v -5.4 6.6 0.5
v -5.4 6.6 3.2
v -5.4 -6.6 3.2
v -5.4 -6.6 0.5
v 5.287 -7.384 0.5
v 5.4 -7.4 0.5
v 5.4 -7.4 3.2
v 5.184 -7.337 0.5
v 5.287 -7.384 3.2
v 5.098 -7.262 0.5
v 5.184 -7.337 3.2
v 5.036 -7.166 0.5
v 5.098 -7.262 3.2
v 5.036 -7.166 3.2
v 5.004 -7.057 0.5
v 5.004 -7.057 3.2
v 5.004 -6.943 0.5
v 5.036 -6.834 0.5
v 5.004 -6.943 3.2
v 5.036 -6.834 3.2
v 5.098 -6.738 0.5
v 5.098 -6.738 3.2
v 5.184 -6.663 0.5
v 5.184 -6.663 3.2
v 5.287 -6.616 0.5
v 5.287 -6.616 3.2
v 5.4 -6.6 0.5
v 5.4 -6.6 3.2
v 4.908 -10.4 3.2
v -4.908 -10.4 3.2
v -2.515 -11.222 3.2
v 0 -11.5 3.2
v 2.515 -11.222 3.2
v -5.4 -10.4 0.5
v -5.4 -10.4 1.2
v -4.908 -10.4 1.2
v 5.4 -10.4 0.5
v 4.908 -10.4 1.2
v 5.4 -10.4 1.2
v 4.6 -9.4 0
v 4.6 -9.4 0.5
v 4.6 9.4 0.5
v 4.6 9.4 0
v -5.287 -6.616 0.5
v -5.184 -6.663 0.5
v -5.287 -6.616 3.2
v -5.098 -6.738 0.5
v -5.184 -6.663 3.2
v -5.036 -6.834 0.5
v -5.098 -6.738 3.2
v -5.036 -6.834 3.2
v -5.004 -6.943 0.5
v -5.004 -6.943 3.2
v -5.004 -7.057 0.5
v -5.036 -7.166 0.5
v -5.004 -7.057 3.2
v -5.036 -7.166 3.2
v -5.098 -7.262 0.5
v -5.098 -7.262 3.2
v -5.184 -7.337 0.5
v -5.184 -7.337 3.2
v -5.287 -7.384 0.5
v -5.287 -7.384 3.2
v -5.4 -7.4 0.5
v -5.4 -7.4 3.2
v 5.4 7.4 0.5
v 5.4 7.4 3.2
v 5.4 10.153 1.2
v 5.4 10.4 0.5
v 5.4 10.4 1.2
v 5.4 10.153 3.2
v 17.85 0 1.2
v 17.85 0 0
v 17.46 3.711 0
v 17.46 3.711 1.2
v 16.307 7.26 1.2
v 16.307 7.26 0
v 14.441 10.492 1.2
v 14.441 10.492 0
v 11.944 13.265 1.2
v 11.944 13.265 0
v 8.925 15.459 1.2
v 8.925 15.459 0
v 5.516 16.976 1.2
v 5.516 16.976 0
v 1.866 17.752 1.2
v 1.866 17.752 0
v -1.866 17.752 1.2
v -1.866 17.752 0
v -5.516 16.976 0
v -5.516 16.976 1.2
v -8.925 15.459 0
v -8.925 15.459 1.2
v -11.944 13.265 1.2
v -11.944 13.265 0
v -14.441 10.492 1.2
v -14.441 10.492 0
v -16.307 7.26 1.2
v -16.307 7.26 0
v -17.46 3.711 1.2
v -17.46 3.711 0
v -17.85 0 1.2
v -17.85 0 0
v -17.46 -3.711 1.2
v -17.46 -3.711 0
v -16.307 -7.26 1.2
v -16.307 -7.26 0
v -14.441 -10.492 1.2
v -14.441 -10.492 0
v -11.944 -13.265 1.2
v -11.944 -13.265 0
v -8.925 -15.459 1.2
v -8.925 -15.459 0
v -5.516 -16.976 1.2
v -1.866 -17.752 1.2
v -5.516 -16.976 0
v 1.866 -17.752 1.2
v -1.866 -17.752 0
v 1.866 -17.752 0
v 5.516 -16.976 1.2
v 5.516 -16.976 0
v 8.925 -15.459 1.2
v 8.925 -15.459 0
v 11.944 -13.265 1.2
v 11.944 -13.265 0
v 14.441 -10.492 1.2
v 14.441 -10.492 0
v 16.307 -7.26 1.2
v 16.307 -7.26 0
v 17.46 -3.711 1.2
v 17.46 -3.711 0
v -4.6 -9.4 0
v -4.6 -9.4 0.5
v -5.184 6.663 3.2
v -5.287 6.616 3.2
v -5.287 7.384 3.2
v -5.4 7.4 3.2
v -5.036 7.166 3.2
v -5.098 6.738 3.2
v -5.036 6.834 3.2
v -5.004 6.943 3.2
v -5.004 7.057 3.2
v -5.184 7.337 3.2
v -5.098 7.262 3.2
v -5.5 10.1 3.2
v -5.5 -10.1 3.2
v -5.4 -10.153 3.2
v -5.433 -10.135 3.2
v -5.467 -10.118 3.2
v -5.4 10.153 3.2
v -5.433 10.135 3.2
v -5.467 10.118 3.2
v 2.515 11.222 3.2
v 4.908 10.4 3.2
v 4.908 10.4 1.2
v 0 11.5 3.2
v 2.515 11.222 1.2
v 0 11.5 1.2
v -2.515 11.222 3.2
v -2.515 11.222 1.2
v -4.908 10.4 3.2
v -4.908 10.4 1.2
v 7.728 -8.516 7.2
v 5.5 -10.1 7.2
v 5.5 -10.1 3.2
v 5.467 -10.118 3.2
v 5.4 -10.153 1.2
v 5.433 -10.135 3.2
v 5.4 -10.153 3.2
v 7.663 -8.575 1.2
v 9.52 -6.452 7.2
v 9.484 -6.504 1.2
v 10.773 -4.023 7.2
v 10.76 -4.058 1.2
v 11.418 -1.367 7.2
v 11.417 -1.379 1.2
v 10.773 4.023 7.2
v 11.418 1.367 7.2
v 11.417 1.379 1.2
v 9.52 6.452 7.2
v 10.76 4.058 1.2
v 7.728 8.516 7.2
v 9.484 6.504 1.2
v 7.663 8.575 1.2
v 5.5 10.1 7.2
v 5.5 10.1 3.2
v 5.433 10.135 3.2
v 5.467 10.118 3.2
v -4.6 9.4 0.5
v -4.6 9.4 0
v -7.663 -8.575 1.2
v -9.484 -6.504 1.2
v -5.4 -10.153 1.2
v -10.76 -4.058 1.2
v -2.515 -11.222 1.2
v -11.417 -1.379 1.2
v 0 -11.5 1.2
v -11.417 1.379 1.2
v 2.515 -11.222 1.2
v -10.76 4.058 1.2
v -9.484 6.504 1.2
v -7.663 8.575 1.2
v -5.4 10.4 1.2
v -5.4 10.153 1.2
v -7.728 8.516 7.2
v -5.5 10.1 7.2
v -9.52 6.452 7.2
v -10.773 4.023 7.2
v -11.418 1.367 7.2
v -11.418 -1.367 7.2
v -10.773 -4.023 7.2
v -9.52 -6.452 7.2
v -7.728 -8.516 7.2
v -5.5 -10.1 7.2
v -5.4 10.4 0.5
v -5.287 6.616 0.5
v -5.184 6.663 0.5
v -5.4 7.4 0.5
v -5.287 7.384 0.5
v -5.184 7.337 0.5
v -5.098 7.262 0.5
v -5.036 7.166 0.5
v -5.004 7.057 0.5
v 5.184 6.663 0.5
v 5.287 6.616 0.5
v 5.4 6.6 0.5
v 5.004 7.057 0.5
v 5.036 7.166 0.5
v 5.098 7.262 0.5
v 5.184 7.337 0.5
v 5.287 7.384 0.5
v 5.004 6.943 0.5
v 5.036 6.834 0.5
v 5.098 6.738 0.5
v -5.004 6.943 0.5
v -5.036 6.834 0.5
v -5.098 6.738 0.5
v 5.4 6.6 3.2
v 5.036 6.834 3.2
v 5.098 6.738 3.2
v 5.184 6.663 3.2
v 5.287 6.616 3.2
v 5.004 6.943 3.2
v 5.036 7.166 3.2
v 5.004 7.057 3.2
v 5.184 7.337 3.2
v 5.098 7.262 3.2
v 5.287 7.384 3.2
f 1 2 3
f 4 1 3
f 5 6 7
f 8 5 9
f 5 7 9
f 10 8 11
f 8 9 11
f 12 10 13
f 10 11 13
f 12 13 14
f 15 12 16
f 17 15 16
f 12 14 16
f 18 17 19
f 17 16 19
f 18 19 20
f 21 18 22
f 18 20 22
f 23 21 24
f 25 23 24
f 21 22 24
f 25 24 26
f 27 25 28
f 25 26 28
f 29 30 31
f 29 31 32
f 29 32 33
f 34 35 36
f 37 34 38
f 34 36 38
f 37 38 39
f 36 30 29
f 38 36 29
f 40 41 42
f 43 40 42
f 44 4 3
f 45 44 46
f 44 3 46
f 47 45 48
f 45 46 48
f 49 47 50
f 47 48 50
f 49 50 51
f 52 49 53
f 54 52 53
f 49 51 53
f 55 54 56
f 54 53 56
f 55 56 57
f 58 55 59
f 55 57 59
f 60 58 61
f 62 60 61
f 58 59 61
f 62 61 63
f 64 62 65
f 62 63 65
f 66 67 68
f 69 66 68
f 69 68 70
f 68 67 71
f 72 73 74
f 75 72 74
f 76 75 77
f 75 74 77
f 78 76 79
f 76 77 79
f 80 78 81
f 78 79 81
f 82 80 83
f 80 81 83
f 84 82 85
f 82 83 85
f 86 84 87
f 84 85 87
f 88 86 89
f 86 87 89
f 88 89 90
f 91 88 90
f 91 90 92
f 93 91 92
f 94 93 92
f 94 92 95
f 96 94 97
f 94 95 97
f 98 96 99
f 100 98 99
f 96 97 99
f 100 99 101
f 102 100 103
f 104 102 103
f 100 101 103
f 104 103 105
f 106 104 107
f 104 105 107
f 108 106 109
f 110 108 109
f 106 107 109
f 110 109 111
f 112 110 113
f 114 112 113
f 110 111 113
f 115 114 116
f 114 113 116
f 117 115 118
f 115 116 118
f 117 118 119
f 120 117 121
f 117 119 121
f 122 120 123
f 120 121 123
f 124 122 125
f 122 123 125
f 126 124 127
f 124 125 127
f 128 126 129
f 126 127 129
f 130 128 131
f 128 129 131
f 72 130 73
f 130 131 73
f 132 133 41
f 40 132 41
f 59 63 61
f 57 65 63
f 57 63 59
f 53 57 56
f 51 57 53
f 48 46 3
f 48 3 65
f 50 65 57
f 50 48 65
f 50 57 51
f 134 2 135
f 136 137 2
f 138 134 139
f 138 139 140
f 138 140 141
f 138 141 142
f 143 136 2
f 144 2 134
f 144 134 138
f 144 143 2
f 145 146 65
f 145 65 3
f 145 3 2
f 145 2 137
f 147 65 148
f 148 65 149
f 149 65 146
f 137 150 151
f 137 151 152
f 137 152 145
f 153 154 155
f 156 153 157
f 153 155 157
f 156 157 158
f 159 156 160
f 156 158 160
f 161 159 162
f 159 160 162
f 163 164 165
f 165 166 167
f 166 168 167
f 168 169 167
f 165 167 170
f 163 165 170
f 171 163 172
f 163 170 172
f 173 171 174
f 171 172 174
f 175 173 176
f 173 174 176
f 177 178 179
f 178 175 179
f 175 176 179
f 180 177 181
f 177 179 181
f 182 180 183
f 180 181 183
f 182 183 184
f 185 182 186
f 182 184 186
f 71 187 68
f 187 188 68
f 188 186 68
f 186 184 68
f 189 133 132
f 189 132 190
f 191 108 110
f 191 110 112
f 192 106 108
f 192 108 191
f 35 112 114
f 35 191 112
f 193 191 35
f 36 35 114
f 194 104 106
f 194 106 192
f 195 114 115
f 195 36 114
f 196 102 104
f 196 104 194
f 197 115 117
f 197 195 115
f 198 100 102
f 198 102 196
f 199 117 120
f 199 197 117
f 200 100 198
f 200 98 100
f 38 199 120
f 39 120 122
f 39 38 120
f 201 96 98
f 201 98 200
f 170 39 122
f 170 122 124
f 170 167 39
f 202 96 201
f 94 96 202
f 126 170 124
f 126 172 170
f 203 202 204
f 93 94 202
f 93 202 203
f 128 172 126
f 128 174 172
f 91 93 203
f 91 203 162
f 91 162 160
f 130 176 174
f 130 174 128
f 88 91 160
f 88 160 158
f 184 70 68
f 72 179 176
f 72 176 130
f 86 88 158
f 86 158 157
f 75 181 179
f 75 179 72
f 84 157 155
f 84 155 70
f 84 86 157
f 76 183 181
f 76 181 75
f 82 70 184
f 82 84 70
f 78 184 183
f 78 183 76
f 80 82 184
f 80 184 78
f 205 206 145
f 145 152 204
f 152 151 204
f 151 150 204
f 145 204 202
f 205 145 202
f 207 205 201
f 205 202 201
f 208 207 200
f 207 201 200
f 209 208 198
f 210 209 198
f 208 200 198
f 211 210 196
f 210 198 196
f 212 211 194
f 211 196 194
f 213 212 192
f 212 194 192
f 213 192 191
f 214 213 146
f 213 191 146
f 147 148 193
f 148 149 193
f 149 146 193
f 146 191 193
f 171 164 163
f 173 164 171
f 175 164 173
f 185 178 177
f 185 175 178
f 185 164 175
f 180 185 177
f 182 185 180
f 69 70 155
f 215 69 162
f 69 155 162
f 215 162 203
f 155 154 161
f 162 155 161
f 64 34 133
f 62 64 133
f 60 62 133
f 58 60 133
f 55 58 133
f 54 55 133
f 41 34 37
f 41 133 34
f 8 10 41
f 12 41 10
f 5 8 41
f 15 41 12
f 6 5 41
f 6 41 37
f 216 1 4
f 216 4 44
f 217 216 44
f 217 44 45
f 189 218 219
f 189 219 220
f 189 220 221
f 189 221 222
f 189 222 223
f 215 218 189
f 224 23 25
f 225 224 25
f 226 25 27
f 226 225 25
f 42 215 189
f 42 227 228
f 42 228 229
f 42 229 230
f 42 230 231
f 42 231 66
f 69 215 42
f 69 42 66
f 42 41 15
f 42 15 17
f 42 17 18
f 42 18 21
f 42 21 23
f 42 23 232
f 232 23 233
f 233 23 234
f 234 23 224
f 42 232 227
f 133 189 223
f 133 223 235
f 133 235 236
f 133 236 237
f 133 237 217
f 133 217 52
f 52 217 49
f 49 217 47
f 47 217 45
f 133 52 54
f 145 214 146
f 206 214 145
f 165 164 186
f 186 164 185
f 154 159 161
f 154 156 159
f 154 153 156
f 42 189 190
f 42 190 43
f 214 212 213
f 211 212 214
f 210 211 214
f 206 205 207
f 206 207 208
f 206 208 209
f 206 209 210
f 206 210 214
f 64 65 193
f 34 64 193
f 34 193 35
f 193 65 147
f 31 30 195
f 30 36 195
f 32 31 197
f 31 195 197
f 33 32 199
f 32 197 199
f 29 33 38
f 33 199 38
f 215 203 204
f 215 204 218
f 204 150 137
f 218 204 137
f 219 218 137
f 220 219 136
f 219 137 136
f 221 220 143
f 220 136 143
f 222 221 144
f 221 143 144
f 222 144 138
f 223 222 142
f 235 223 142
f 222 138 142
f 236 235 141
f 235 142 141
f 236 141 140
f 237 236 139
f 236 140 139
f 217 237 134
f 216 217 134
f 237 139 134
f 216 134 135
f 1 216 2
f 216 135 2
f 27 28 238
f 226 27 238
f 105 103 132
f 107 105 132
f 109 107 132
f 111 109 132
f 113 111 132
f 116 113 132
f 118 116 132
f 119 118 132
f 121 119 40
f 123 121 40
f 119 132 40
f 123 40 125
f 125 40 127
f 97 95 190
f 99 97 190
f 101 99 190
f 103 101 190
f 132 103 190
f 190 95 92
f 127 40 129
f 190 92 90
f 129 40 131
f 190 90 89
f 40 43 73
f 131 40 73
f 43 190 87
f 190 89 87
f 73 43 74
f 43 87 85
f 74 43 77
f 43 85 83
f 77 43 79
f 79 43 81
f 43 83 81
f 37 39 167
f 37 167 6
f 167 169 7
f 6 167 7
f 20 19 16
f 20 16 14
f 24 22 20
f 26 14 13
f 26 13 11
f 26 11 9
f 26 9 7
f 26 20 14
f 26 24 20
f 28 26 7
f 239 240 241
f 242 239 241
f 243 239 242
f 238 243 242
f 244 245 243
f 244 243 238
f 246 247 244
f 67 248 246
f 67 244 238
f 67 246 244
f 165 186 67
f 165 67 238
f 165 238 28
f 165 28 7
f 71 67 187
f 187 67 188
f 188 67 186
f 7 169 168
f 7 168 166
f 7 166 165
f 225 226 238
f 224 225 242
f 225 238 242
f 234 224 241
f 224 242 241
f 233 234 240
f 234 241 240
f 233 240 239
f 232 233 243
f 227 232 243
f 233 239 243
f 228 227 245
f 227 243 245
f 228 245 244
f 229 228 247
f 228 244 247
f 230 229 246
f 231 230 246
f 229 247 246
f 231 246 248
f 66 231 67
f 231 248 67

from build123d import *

# Parameters (mm, degrees)
F0_R     = 17.85
F1_DEPTH = 1.2
F2_R     = 11.5
F3_DEPTH = 6
F4_W     = 9.2
F4_H     = 18.8
F5_DEPTH = 7.201
F7_DEPTH = 6.7
F8_W     = 11
F8_H     = 25
F9_DEPTH = 4


with BuildPart() as f1:
    # F0 (on Top) → F1 (new body)
    with BuildSketch(Plane.XY):
        Circle(F0_R)
    extrude(amount=F1_DEPTH)

    # F2 (on face) → F3 (join)
    with BuildSketch(Plane.XY.offset(1.2)):
        Circle(F2_R)
    extrude(amount=F3_DEPTH)

    # F4 (on face) → F5 (cut, through all)
    with BuildSketch(Plane.XY.offset(7.2)):
        Rectangle(F4_W, F4_H)
    extrude(amount=-F5_DEPTH, mode=Mode.SUBTRACT)

    # F6 (on face) → F7 (cut)
    with BuildSketch(Plane.XY.offset(7.2)):
        with BuildLine():
            Line((5.4, 10.4), (-5.4, 10.4))
            Line((-5.4, 10.4), (-5.4, 7.4))
            ThreePointArc((-5.4, 7.4), (-5, 7), (-5.4, 6.6))
            Line((-5.4, 6.6), (-5.4, -6.6))
            ThreePointArc((-5.4, -6.6), (-5, -7), (-5.4, -7.4))
            Line((-5.4, -7.4), (-5.4, -10.4))
            Line((-5.4, -10.4), (5.4, -10.4))
            Line((5.4, -10.4), (5.4, -7.4))
            ThreePointArc((5.4, -7.4), (5, -7), (5.4, -6.6))
            Line((5.4, -6.6), (5.4, 6.6))
            ThreePointArc((5.4, 6.6), (5, 7), (5.4, 7.4))
            Line((5.4, 7.4), (5.4, 10.4))
        make_face()
    extrude(amount=-F7_DEPTH, mode=Mode.SUBTRACT)

    # F8 (on face) → F9 (cut)
    with BuildSketch(Plane.XY.offset(7.2)):
        Rectangle(F8_W, F8_H)
    extrude(amount=-F9_DEPTH, mode=Mode.SUBTRACT)


solid = f1.part
